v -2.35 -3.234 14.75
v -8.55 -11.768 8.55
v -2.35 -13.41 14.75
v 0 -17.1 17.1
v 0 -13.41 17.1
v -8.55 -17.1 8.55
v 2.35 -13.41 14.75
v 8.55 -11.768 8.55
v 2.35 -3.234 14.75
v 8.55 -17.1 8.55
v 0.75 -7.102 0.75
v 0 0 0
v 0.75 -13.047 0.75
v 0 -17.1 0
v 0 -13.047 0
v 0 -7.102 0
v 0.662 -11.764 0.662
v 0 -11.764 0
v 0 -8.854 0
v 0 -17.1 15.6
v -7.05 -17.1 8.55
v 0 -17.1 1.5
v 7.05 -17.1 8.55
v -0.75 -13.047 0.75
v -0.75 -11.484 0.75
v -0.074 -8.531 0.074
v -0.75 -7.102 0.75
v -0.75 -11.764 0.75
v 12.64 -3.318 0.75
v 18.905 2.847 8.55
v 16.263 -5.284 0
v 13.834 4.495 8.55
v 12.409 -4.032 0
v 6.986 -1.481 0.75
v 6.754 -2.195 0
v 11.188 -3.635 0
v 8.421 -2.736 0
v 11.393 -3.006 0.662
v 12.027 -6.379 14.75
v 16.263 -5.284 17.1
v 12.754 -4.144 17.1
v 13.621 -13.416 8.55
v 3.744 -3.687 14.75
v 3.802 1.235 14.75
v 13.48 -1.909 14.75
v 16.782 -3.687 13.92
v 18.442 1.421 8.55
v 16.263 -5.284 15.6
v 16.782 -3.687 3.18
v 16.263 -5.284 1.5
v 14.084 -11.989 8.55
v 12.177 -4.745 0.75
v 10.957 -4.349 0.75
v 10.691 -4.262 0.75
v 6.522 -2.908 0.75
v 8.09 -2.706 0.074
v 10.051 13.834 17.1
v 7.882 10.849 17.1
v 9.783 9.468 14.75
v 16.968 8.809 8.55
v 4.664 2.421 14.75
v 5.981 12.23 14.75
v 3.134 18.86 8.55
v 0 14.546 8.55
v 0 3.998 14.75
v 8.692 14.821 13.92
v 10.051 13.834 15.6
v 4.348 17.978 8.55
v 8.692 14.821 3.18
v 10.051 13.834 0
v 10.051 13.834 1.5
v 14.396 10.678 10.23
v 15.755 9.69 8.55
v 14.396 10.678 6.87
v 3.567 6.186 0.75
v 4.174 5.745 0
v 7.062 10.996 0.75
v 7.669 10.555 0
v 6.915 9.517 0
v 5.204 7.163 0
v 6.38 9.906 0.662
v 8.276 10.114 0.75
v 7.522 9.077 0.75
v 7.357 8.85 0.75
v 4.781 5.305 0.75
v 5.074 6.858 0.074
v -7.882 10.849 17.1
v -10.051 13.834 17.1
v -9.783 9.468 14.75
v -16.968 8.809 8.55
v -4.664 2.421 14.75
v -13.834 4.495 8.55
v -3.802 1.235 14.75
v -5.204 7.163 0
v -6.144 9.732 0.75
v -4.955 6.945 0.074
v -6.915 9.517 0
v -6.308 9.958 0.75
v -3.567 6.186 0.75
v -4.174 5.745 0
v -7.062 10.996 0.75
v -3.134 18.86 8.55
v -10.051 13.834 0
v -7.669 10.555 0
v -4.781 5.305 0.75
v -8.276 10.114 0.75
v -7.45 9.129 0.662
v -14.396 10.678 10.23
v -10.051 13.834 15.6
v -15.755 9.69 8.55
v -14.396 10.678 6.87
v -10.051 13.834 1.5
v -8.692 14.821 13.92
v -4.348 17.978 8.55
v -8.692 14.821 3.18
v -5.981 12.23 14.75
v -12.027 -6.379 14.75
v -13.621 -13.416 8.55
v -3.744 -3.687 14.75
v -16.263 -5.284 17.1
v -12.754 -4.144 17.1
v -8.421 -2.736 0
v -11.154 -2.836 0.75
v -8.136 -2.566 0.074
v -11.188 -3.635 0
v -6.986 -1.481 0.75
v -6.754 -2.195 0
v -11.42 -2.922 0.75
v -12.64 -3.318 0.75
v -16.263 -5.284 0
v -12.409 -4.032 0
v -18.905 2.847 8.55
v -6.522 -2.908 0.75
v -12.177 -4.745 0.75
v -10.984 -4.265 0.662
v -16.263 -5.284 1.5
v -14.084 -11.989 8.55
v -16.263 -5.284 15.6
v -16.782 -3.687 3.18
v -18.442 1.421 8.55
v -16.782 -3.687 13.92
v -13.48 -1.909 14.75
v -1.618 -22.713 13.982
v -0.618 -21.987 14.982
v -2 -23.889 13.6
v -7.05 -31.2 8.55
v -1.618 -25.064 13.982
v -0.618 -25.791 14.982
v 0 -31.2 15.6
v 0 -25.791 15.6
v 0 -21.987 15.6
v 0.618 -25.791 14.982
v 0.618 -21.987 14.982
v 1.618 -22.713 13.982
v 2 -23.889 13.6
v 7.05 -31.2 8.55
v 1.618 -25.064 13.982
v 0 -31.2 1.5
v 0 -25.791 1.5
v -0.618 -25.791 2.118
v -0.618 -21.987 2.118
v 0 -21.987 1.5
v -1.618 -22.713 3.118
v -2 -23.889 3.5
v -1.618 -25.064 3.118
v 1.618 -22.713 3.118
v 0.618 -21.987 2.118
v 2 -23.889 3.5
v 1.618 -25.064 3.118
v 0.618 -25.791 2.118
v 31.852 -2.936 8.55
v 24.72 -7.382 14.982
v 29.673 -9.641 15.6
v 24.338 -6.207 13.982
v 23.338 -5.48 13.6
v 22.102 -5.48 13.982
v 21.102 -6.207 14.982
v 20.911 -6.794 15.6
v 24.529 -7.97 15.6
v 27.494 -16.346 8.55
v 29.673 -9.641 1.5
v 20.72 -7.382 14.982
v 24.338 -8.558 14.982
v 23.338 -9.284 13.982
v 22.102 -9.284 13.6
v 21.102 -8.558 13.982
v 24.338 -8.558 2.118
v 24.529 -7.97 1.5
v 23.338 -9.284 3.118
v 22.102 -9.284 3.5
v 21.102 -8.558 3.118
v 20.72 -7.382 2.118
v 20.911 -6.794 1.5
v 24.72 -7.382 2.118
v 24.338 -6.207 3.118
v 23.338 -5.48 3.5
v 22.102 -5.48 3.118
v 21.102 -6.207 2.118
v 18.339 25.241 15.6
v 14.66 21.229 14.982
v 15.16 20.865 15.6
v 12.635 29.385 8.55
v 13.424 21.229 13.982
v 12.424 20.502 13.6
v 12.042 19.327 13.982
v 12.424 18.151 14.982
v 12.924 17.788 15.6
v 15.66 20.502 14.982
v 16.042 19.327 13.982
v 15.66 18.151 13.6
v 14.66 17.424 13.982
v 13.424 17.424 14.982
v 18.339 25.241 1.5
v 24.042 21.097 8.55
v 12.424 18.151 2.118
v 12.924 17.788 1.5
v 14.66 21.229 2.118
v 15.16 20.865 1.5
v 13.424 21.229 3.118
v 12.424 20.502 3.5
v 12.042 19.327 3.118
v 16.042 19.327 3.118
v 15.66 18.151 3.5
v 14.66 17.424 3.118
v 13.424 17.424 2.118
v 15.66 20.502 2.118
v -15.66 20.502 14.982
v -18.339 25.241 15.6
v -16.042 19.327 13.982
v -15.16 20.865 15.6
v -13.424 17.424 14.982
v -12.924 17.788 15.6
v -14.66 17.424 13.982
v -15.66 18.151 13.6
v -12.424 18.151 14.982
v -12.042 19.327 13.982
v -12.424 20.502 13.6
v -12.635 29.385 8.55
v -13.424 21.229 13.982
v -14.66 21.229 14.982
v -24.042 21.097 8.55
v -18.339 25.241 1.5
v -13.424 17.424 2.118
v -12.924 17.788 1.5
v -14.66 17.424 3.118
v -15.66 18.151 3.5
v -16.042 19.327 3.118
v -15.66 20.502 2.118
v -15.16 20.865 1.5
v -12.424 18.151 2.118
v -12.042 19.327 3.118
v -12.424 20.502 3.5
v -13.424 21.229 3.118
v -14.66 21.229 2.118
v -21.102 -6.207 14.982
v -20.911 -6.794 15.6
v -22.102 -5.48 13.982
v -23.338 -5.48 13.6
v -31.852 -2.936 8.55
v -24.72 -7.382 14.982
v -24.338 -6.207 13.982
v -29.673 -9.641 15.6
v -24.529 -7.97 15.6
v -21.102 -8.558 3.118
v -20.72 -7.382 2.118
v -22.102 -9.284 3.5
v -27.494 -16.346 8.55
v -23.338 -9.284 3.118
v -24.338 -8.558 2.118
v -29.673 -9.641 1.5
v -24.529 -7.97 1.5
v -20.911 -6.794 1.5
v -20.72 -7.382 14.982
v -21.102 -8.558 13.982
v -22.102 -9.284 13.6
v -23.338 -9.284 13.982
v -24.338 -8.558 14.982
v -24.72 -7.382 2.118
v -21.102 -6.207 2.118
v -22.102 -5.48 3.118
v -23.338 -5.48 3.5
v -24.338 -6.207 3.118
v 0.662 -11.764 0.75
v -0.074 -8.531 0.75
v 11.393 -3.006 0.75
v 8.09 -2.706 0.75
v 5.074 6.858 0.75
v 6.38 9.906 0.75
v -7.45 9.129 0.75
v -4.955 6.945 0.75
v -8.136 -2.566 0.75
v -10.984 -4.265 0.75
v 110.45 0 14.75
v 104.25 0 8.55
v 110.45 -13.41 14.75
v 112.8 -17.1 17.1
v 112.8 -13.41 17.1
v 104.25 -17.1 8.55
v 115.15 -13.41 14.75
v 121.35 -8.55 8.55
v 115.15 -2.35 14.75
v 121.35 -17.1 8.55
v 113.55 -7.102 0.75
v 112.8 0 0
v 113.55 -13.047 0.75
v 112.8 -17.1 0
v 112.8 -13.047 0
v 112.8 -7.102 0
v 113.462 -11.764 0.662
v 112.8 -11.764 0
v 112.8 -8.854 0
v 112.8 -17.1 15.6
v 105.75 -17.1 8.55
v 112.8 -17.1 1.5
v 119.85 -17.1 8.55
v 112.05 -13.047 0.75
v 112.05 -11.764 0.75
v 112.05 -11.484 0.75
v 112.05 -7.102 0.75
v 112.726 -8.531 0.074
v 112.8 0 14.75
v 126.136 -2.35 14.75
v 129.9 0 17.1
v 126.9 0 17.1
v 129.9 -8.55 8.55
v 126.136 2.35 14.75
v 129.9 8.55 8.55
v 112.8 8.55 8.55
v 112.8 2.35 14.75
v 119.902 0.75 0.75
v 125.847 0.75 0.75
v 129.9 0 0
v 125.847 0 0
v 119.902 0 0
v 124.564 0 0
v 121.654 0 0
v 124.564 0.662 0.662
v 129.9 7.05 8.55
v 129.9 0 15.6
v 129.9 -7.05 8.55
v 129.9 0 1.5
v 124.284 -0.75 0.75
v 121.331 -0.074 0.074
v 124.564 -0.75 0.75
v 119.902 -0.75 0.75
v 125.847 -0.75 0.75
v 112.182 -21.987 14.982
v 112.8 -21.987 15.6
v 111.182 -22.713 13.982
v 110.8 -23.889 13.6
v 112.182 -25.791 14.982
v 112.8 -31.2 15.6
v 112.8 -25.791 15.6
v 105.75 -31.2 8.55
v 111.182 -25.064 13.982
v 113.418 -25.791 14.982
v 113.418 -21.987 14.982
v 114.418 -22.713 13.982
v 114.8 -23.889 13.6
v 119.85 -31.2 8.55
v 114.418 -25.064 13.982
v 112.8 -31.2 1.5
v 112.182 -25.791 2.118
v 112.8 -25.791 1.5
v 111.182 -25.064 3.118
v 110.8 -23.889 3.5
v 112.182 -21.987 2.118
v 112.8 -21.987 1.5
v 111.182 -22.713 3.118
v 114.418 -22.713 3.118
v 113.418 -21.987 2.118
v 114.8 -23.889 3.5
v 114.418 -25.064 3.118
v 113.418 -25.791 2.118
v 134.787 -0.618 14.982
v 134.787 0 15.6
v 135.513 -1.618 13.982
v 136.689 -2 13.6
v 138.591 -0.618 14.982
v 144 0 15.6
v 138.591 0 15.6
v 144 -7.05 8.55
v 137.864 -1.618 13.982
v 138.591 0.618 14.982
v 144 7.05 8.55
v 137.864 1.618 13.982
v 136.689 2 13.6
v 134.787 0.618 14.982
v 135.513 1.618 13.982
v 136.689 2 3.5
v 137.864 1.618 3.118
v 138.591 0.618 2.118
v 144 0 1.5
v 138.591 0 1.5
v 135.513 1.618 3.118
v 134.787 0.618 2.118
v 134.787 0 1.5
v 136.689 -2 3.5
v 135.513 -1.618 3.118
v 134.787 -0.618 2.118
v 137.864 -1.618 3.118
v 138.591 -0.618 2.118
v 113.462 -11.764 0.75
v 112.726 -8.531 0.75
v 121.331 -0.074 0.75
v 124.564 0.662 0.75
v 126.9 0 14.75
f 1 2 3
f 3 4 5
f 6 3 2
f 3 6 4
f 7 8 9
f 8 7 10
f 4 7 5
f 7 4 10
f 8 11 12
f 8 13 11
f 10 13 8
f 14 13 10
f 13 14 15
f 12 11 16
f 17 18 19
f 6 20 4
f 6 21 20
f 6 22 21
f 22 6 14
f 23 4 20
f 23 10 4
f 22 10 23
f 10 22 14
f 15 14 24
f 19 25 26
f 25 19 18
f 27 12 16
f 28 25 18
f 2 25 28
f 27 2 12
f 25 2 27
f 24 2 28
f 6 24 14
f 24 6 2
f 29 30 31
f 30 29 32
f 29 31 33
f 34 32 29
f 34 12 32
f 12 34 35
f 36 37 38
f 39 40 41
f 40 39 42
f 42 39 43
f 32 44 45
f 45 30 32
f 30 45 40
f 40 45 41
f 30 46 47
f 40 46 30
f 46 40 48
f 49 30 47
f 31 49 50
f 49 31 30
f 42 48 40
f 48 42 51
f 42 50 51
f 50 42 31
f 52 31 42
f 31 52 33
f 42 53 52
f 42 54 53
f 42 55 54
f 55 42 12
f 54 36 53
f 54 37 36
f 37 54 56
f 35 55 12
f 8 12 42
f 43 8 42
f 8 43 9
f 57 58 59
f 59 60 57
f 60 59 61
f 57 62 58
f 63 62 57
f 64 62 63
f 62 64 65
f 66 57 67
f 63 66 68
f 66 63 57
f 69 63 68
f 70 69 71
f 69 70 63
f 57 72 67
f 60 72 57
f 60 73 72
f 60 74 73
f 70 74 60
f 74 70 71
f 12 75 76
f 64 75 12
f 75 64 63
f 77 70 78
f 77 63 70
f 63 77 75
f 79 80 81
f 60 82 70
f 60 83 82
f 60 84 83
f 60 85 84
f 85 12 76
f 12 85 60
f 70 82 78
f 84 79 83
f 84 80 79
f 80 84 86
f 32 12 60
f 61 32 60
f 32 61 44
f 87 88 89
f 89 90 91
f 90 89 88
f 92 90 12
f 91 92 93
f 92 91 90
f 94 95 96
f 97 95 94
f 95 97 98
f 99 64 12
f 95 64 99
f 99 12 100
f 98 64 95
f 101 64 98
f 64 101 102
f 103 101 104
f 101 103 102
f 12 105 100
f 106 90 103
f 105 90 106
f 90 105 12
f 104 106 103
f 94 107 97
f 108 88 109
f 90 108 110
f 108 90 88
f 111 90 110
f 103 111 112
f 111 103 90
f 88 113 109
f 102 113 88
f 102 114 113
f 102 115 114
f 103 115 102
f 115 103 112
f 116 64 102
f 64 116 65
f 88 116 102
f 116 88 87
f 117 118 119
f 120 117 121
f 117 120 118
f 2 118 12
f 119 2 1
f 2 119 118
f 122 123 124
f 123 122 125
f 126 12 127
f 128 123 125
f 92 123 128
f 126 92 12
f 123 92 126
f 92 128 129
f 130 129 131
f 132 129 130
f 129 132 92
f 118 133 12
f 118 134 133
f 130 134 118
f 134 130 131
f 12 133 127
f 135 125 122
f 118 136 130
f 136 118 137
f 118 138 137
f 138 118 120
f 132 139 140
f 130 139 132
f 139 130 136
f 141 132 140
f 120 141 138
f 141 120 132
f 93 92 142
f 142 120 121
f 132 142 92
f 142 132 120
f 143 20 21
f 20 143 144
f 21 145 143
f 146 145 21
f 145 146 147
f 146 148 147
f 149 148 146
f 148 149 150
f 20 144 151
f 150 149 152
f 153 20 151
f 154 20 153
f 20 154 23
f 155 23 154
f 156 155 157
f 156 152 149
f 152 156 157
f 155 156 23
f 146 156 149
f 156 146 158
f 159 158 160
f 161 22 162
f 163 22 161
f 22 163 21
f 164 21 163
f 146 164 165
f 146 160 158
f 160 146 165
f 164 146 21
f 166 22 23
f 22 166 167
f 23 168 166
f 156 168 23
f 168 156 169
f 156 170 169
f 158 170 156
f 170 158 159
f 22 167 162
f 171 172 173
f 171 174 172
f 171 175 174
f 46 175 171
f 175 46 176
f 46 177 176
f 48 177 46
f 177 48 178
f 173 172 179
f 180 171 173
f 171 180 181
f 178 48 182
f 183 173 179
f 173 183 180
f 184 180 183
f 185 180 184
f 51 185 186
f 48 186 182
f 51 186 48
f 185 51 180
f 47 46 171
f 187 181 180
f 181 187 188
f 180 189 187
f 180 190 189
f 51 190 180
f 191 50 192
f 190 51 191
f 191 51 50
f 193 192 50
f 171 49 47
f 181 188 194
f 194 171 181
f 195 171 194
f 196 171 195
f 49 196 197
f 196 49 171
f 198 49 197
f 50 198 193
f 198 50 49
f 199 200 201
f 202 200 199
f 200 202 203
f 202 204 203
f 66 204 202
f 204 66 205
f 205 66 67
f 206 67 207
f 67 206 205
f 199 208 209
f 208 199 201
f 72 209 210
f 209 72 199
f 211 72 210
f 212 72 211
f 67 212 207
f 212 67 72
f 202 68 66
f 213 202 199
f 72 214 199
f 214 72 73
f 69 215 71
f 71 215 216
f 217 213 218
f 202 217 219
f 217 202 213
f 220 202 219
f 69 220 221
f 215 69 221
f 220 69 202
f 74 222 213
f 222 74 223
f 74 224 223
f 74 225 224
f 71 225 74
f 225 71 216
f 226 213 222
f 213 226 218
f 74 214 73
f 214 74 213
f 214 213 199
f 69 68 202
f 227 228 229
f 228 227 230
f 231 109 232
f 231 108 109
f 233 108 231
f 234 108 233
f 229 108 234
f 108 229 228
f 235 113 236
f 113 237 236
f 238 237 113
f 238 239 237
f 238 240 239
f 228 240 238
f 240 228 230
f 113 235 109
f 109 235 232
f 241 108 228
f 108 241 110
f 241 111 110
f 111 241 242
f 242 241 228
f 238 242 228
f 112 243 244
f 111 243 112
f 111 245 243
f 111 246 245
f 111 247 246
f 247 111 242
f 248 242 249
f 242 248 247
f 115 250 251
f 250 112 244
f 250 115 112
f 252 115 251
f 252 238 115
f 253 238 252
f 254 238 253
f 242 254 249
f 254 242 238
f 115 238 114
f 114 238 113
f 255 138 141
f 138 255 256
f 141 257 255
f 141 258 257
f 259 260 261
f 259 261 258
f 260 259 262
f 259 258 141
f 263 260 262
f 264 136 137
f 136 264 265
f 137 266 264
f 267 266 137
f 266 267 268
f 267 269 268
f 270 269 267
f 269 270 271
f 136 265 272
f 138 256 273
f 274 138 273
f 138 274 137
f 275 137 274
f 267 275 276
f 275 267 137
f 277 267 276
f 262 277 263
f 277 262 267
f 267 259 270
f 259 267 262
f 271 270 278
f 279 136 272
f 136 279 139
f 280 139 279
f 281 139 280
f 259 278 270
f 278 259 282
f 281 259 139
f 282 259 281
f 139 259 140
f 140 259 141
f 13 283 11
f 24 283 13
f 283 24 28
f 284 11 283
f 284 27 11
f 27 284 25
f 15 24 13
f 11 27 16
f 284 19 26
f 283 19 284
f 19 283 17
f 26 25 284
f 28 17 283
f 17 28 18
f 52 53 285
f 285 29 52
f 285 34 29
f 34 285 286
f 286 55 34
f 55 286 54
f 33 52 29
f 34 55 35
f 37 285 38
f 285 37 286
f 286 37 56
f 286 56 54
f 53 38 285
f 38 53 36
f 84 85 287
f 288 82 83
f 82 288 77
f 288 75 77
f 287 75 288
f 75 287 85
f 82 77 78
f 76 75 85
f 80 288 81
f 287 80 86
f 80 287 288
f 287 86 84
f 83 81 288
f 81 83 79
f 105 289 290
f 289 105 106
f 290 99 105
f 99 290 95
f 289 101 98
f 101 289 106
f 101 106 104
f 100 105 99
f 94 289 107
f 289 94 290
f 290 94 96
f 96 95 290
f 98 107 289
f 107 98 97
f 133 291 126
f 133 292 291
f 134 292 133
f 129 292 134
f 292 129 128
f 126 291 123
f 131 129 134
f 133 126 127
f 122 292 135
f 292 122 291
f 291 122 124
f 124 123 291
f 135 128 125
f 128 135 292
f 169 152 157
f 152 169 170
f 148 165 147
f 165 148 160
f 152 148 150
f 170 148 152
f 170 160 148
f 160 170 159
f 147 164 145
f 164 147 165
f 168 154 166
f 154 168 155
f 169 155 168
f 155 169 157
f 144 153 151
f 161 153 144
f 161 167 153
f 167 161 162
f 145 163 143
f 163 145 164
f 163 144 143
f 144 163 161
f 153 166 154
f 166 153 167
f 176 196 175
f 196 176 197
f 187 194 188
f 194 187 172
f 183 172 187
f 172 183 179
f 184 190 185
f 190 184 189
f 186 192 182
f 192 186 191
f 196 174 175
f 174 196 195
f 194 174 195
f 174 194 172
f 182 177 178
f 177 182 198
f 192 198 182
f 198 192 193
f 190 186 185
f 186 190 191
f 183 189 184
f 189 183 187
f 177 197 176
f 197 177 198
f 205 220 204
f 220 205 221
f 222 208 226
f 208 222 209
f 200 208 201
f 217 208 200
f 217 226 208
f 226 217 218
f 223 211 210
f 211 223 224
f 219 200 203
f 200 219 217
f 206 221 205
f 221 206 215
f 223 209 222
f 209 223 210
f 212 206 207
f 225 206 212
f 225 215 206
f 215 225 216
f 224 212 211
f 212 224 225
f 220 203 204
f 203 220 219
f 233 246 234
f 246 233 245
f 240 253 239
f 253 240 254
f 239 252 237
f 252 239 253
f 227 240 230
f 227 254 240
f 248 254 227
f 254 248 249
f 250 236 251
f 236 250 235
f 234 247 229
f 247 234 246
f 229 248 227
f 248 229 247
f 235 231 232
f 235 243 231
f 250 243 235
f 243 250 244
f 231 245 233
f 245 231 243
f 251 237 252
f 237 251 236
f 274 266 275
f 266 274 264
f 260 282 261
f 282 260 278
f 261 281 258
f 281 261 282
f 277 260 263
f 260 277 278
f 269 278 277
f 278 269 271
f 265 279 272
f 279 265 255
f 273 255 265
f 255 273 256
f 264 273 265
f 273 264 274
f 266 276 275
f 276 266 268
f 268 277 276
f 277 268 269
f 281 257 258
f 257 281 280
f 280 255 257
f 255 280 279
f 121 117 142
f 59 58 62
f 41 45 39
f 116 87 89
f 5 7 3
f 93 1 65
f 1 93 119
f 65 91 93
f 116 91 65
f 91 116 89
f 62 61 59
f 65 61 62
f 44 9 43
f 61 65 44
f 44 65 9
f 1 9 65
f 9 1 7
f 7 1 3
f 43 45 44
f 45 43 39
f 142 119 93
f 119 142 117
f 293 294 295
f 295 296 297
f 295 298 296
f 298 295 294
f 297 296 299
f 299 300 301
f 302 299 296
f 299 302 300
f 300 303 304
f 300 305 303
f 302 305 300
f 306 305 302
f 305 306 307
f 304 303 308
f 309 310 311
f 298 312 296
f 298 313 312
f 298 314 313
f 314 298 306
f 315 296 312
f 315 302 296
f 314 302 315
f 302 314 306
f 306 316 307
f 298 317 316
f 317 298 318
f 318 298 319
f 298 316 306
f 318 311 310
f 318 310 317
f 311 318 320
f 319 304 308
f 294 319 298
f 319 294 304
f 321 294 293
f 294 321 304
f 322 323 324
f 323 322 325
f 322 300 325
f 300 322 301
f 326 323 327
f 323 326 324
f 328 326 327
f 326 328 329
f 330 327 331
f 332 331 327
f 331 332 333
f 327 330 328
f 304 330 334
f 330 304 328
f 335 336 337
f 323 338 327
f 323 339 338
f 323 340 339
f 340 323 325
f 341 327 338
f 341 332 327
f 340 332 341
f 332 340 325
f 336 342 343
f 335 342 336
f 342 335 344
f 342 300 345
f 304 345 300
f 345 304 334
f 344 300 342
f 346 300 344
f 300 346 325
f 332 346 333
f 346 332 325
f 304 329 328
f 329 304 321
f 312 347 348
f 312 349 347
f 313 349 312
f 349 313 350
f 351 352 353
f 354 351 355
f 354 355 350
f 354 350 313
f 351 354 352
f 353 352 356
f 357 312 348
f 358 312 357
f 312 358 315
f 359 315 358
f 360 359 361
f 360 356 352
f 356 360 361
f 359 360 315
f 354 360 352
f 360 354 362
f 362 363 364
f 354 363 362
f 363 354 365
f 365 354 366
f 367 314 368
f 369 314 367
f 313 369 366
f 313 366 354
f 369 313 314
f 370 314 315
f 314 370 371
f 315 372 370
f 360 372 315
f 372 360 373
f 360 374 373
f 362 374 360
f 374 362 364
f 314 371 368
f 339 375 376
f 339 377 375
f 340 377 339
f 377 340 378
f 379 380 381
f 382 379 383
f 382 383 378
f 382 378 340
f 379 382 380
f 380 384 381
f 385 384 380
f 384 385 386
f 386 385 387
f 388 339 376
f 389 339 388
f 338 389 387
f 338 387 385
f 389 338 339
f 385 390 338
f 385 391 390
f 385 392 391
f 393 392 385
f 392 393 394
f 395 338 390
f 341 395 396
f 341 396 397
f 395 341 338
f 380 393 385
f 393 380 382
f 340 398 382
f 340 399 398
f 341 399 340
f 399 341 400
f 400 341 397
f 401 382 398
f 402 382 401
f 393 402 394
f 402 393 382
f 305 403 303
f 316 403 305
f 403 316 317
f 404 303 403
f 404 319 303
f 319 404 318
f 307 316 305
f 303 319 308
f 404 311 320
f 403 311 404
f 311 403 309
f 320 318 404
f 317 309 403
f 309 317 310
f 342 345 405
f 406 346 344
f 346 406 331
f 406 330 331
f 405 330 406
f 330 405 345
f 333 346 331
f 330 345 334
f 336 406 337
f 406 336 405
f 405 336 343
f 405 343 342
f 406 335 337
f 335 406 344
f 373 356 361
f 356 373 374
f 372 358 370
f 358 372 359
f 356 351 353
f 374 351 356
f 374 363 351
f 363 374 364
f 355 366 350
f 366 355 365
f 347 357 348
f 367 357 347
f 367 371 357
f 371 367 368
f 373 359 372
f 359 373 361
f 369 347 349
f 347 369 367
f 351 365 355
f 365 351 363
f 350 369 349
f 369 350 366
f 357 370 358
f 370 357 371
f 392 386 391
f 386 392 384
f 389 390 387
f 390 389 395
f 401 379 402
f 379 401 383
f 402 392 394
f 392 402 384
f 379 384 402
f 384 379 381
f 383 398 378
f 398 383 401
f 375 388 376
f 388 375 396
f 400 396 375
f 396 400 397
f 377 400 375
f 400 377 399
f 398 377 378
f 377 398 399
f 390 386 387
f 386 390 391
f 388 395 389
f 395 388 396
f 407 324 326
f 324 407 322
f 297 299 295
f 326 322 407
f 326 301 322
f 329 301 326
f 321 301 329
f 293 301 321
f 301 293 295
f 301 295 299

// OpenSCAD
// Based on the info from https://www.domerama.com/calculators/

DEBUG = false;

$fn = 10;
dome_frequency = "1V";  // [1V, 2V, 3V3/8, 5V Mexican]
hub_body_type = "pipe"; // [pipe, solid]
strut_thikness = 1.5;
strut_inner_diameter = 14.1; //[::float]
screw_holde_diameter = 4;
strut_edge_geometry = 4;

/* [Hidden] */
font_size = (strut_inner_diameter + strut_thikness) / 2;
hub_diameter = strut_inner_diameter * 4;
hub_radius = hub_diameter / 2;
strut_radius = strut_inner_diameter / 2;
render_all_spacing = strut_inner_diameter * 8;
strut_hub_center_offset = 9 * strut_inner_diameter / 10;
// Strut socket angles
freq_1V_strut_angles = [[ "A", 0 ]];
freq_2V_strut_angles = [ [ "A", 0 ], [ "B", 90 ] ];
freq_3V_3_8_strut_angles = [ [ "A", 0 ], [ "B", 90 ], [ "C", 90 ] ];
freq_5V_mexican_strut_angles =
    [ [ "A", 12.6 ], [ "B", 12.4 ], [ "C", 11.7 ], [ "D", 10.6 ], [ "E", 9 ] ];

// clang-format off
/* [1V] */
render_1V = "all";// [all, penth, quad]
/* [2V] */
render_2V = "all";// [all, hex, penth, quad_left, quad_right]
/* [3V3/8] */
render_3V_3_8 = "all";// [all, hex1, hex2, penth, quad_left, quad_center, quad_right]
/* [5V Mexican] */
render_5V_mexican = "all";// [all, hex1, hex2, hex3, hex4, full_quad, half_quad1_left, half_quad1_right, half_quad2_left, half_quad2_right, tri]
// clang-format on

// Returns all angles from the frequecy_angles structure in a new array
function get_strut_angles(frequecy_angles) = [for (a = frequecy_angles) a[1]];

// Returns the strut angle for the strut_id from frequecy_angles array
function get_strut_angle(frequecy_angles, strut_id) =
    frequecy_angles[search(strut_id, frequecy_angles)[0]][1];

function get_socket_config_angles(frequency_angles, socket_config) = [for (
    strut_id = socket_config) get_strut_angle(frequency_angles, strut_id)];

// Returns the max circumference angle (in degrees) given it's
// full_hub_sector_count and strut_count
function get_circle_angle(full_hub_sector_count, strut_count) =
    full_hub_sector_count ? 360 / full_hub_sector_count * strut_count : 360;

module translate_to_origin(frequency_angles, socket_config) {
  outer_radius = strut_radius + strut_thikness;
  max_angle = max(get_socket_config_angles(frequency_angles, socket_config));
  origin_offset = outer_radius * cos(max_angle) + hub_radius * sin(max_angle);
  translate([ 0, 0, origin_offset ]) children();
}

module grid_layout(render_what, col, row, coloration) {
  grid = render_what == "all"
             ? [ render_all_spacing * row, render_all_spacing * col, 0 ]
             : [ 0, 0, 0 ];
  translate(grid) color(DEBUG ? undef : coloration) children();
}

// Renders the strut_id letter on the top of the hub
module strut_id_letters(frequency_angles, socket_config,
                        full_hub_sector_count) {
  strut_count = len(socket_config);
  circle_angle = get_circle_angle(full_hub_sector_count, strut_count);
  min_angle = min(get_strut_angles(frequency_angles));

  for (i = [0:strut_count - 1]) {
    strut_angle = get_strut_angle(frequency_angles, socket_config[i]);
    rotate([ -min_angle, 0, 180 + i * circle_angle / strut_count ]) translate([
      0, (2 * strut_thikness + hub_radius) / 2.8,
      -strut_radius - strut_thikness / 2
    ]) rotate([ 180, 0, 0 ]) linear_extrude(strut_thikness * 2) {
      text(socket_config[i], size = font_size,
           font = "DejaVu Sans Mono:style=Bold", valign = "center",
           halign = "center");
    }
  }
}

// Renders the screw holes on the bottom of the hub
module screw_holes(frequency_angles, socket_config, full_hub_sector_count) {
  strut_count = len(socket_config);
  circle_angle = get_circle_angle(full_hub_sector_count, strut_count);
  min_angle = max(get_strut_angles(frequency_angles));
  for (i = [0:strut_count - 1]) {
    strut_angle = get_strut_angle(frequency_angles, socket_config[i]);
    for (mult = [2.7:1:2.7]) { // Tweak for multiple screws
      screw_hole_start = -(hub_diameter / mult) * cos(min_angle);
      rotate([ -min_angle, 0, 180 + i * circle_angle / strut_count ]) translate(
          [ 0, hub_diameter / mult + 2 * strut_thikness, screw_hole_start ])
          cylinder(h = strut_inner_diameter * 3, d = screw_holde_diameter,
                   center = false);
    }
  }
}

module layout_struts(frequency_angles, socket_config, strut_thikness,
                     full_hub_sector_count) {
  strut_count = len(socket_config);
  circle_angle = get_circle_angle(full_hub_sector_count, strut_count);
  for ($i = [0:strut_count - 1]) {
    $strut_angle = get_strut_angle(frequency_angles, socket_config[$i]);
    rotate([ 90 + $strut_angle, 0, $i * circle_angle / strut_count ])
        translate([ 0, 0, strut_hub_center_offset ]) children();
  }
}

// Renders the main body of the hub
module body(frequency_angles, socket_config, full_hub_sector_count) {
  strut_count = len(socket_config);
  circle_angle = get_circle_angle(full_hub_sector_count, strut_count);
  for (i = [0:strut_count - 1]) {
    strut_angle = get_strut_angle(frequency_angles, socket_config[i]);
    rotate([ 90 + strut_angle, 0, i * circle_angle / strut_count ])
        cylinder(h = strut_thikness * 2 + hub_radius / 2,
                 d = strut_inner_diameter + strut_thikness * 2, center = false,
                 $fn = strut_edge_geometry);
  }
}

// Renders all the peripheral strut sockets
module peripheral_socket(frequency_angles, socket_config, strut_thikness,
                         full_hub_sector_count) {
  min_angle = min(get_strut_angles(frequency_angles));
  strut_hub_depth = hub_radius - strut_hub_center_offset * cos(min_angle) +
                    2 * strut_thikness;
  layout_struts(frequency_angles, socket_config, strut_thikness,
                full_hub_sector_count)
      cylinder(h = strut_hub_depth, d = strut_inner_diameter, center = false,
               $fn = strut_edge_geometry);
}

// Renders a center strut socket
module center_socket(frequency_angles, socket_config,
                     diameter = strut_inner_diameter * 2) {
  max_angle = max(get_socket_config_angles(frequency_angles, socket_config));
  outer_radius = strut_radius + strut_thikness;
  origin_offset = outer_radius * cos(max_angle) + hub_radius * sin(max_angle);
  offset = outer_radius * cos((max_angle)) - hub_radius / 12;
  center_socket_height = origin_offset + offset + strut_thikness / 4;
  translate([ 0, 0, offset ])
      cylinder(h = offset, d = diameter, center = false);
}

module center_reinforcement(frequency_angles, socket_config) {
  //  center_socket(frequency_angles, socket_config,
  //                strut_inner_diameter + strut_thikness * 2);
}

module bottom_support(frequency_angles, socket_config, full_hub_sector_count) {}

// Fully renders the hub both in debugging or production modes
module hub(frequency_angles, socket_config, full_hub_sector_count = undef) {
  // Align the hub base with the origin
  translate_to_origin(frequency_angles, socket_config) {
    if (DEBUG) {
      color("grey")
          screw_holes(frequency_angles, socket_config, full_hub_sector_count);
      color([ 0.5, 0.1, 0.5, 0.5 ])
          peripheral_socket(frequency_angles, socket_config, strut_thikness,
                            full_hub_sector_count);
      color("green", 0.5) center_socket(frequency_angles, socket_config);
      color("red") strut_id_letters(frequency_angles, socket_config,
                                    full_hub_sector_count);
      color([ 1, 1, 0, 0.7 ])
          body(frequency_angles, socket_config, full_hub_sector_count);
      color([ 0, 1, 0, 0.7 ]) bottom_support(frequency_angles, socket_config,
                                             full_hub_sector_count);
      color("cyan", 0.5) center_reinforcement(frequency_angles, socket_config);
    } else {
      difference() {
        union() {
          body(frequency_angles, socket_config, full_hub_sector_count);
          center_reinforcement(frequency_angles, socket_config);
          bottom_support(frequency_angles, socket_config,
                         full_hub_sector_count);
          peripheral_socket(frequency_angles, socket_config, strut_thikness,
                            full_hub_sector_count);
        }
        strut_id_letters(frequency_angles, socket_config,
                         full_hub_sector_count);
        center_socket(frequency_angles, socket_config);
        screw_holes(frequency_angles, socket_config, full_hub_sector_count);
      }
    }
  }
}

// http://www.domerama.com/calculators/1v-geodesic-dome-calculator/
// A x25
module hubs_1V() {
  // PENTH x6
  if (render_1V == "all" || render_1V == "penth")
    grid_layout(render_1V, 0, 0, "red")
        hub(freq_1V_strut_angles, [ "A", "A", "A", "A", "A" ]);
  // QUAD x5
  if (render_1V == "all" || render_1V == "quad")
    grid_layout(render_1V, 0, 1, "orange")
        hub(freq_1V_strut_angles, [ "A", "A" ], 4);
}

// http://www.domerama.com/calculators/2v-geodesic-dome-calculator/
// A x30
// B x35
module hubs_2V() {
  // HEX x10
  if (render_2V == "all" || render_2V == "hex")
    grid_layout(render_2V, 0, 0, "red")
        hub(freq_2V_strut_angles, [ "A", "B", "A" ], 4);
  // PENTH x6
  if (render_2V == "all" || render_2V == "penth")
    grid_layout(render_2V, 0, 1, "orange")
        hub(freq_2V_strut_angles, [ "A", "A", "A", "A", "A" ]);
  // QUAD_LEFT x5
  if (render_2V == "all" || render_2V == "quad_left")
    grid_layout(render_2V, 1, 0, "green")
        hub(freq_2V_strut_angles, [ "B", "A", "B", "B" ], 6);
  // QUAD_RIGHT x5
  if (render_2V == "all" || render_2V == "quad_right")
    grid_layout(render_2V, 1, 1, "purple")
        hub(freq_2V_strut_angles, [ "B", "B", "A", "B" ], 6);
}

// TODO: TO TEST
// http://www.domerama.com/calculators/3v-geodesic-dome-calculator/
// (non-flat at base)
// A x30
// B x40
// C x50
module hubs_3V_3_8() {
  // HEX1 x20
  if (render_3V_3_8 == "all" || render_3V_3_8 == "hex1")
    grid_layout(render_3V_3_8, 0, 0, "red")
        hub(freq_3V_3_8_strut_angles, [ "A", "B", "C", "A", "C" ], 12);
  // HEX2 x5
  if (render_3V_3_8 == "all" || render_3V_3_8 == "hex2")
    grid_layout(render_3V_3_8, 0, 1, "gray")
        hub(freq_3V_3_8_strut_angles, [ "C", "C", "C", "C", "C", "C" ]);
  // PENTH x6
  if (render_3V_3_8 == "all" || render_3V_3_8 == "penth")
    grid_layout(render_3V_3_8, 1, 0, "orange")
        hub(freq_3V_3_8_strut_angles, [ "A", "A", "A", "A", "A" ]);
  // QUAD_LEFT x5
  if (render_3V_3_8 == "all" || render_3V_3_8 == "quad_left")
    grid_layout(render_3V_3_8, 1, 1, "green")
        hub(freq_3V_3_8_strut_angles, [ "B", "A", "B", "C" ], 6);
  // QUAD_CENTER x5
  if (render_3V_3_8 == "all" || render_3V_3_8 == "quad_center")
    grid_layout(render_3V_3_8, 2, 0, "blue")
        hub(freq_3V_3_8_strut_angles, [ "C", "C", "C", "C" ], 6);
  // QUAD_RIGHT x5
  if (render_3V_3_8 == "all" || render_3V_3_8 == "quad_right")
    grid_layout(render_3V_3_8, 2, 1, "purple")
        hub(freq_3V_3_8_strut_angles, [ "C", "B", "A", "B" ], 6);
}

// TODO: TO TEST
// https://www.domerama.com/calculators/octahedral-5v-mexican-method/
// (flat at base)
// A x12
// B x24
// C x36
// D x48
// E x40
module hubs_5V_mexican() {
  // HEX1 x12
  if (render_5V_mexican == "all" || render_5V_mexican == "hex1")
    grid_layout(render_5V_mexican, 0, 0, "red")
        hub(freq_5V_mexican_strut_angles, [ "A", "D", "E", "D", "A", "E" ]);
  // HEX2 x8
  if (render_5V_mexican == "all" || render_5V_mexican == "hex2")
    grid_layout(render_5V_mexican, 0, 1, "gray")
        hub(freq_5V_mexican_strut_angles, [ "B", "C", "E", "C", "B", "E" ]);
  // HEX3 x12
  if (render_5V_mexican == "all" || render_5V_mexican == "hex3")
    grid_layout(render_5V_mexican, 0, 2, "orange")
        hub(freq_5V_mexican_strut_angles, [ "C", "C", "D", "C", "C", "D" ]);
  // HEX4 x12
  if (render_5V_mexican == "all" || render_5V_mexican == "hex4")
    grid_layout(render_5V_mexican, 1, 0, "green")
        hub(freq_5V_mexican_strut_angles, [ "D", "D", "B", "D", "D", "B" ]);
  // FULL_QUAD x1
  if (render_5V_mexican == "all" || render_5V_mexican == "full_quad")
    grid_layout(render_5V_mexican, 1, 1, "blue")
        hub(freq_5V_mexican_strut_angles, [ "E", "E", "E", "E" ]);
  // HALF_QUAD1_LEFT x4
  if (render_5V_mexican == "all" || render_5V_mexican == "half_quad1_left")
    grid_layout(render_5V_mexican, 1, 2, "coral")
        hub(freq_5V_mexican_strut_angles, [ "E", "A", "D", "E" ], 6);
  // HALF_QUAD1_RIGHT x4
  if (render_5V_mexican == "all" || render_5V_mexican == "half_quad1_right")
    grid_layout(render_5V_mexican, 2, 0, "cyan")
        hub(freq_5V_mexican_strut_angles, [ "E", "D", "A", "E" ], 6);
  // HALF_QUAD2_LEFT x4
  if (render_5V_mexican == "all" || render_5V_mexican == "half_quad2_left")
    grid_layout(render_5V_mexican, 2, 1, "pink")
        hub(freq_5V_mexican_strut_angles, [ "E", "B", "C", "E" ], 6);
  // HALF_QUAD2_RIGHT x4
  if (render_5V_mexican == "all" || render_5V_mexican == "half_quad2_right")
    grid_layout(render_5V_mexican, 2, 2, "bisque")
        hub(freq_5V_mexican_strut_angles, [ "E", "C", "B", "E" ], 6);
  // TRI x4
  if (render_5V_mexican == "all" || render_5V_mexican == "tri")
    grid_layout(render_5V_mexican, 3, 0, "purple")
        hub(freq_5V_mexican_strut_angles, [ "E", "E", "E" ], 4);
}

module main() {
  if (dome_frequency == "1V")
    hubs_1V();
  if (dome_frequency == "2V")
    hubs_2V();
  if (dome_frequency == "3V3/8")
    hubs_3V_3_8();
  if (dome_frequency == "5V Mexican")
    hubs_5V_mexican();
}

main();
